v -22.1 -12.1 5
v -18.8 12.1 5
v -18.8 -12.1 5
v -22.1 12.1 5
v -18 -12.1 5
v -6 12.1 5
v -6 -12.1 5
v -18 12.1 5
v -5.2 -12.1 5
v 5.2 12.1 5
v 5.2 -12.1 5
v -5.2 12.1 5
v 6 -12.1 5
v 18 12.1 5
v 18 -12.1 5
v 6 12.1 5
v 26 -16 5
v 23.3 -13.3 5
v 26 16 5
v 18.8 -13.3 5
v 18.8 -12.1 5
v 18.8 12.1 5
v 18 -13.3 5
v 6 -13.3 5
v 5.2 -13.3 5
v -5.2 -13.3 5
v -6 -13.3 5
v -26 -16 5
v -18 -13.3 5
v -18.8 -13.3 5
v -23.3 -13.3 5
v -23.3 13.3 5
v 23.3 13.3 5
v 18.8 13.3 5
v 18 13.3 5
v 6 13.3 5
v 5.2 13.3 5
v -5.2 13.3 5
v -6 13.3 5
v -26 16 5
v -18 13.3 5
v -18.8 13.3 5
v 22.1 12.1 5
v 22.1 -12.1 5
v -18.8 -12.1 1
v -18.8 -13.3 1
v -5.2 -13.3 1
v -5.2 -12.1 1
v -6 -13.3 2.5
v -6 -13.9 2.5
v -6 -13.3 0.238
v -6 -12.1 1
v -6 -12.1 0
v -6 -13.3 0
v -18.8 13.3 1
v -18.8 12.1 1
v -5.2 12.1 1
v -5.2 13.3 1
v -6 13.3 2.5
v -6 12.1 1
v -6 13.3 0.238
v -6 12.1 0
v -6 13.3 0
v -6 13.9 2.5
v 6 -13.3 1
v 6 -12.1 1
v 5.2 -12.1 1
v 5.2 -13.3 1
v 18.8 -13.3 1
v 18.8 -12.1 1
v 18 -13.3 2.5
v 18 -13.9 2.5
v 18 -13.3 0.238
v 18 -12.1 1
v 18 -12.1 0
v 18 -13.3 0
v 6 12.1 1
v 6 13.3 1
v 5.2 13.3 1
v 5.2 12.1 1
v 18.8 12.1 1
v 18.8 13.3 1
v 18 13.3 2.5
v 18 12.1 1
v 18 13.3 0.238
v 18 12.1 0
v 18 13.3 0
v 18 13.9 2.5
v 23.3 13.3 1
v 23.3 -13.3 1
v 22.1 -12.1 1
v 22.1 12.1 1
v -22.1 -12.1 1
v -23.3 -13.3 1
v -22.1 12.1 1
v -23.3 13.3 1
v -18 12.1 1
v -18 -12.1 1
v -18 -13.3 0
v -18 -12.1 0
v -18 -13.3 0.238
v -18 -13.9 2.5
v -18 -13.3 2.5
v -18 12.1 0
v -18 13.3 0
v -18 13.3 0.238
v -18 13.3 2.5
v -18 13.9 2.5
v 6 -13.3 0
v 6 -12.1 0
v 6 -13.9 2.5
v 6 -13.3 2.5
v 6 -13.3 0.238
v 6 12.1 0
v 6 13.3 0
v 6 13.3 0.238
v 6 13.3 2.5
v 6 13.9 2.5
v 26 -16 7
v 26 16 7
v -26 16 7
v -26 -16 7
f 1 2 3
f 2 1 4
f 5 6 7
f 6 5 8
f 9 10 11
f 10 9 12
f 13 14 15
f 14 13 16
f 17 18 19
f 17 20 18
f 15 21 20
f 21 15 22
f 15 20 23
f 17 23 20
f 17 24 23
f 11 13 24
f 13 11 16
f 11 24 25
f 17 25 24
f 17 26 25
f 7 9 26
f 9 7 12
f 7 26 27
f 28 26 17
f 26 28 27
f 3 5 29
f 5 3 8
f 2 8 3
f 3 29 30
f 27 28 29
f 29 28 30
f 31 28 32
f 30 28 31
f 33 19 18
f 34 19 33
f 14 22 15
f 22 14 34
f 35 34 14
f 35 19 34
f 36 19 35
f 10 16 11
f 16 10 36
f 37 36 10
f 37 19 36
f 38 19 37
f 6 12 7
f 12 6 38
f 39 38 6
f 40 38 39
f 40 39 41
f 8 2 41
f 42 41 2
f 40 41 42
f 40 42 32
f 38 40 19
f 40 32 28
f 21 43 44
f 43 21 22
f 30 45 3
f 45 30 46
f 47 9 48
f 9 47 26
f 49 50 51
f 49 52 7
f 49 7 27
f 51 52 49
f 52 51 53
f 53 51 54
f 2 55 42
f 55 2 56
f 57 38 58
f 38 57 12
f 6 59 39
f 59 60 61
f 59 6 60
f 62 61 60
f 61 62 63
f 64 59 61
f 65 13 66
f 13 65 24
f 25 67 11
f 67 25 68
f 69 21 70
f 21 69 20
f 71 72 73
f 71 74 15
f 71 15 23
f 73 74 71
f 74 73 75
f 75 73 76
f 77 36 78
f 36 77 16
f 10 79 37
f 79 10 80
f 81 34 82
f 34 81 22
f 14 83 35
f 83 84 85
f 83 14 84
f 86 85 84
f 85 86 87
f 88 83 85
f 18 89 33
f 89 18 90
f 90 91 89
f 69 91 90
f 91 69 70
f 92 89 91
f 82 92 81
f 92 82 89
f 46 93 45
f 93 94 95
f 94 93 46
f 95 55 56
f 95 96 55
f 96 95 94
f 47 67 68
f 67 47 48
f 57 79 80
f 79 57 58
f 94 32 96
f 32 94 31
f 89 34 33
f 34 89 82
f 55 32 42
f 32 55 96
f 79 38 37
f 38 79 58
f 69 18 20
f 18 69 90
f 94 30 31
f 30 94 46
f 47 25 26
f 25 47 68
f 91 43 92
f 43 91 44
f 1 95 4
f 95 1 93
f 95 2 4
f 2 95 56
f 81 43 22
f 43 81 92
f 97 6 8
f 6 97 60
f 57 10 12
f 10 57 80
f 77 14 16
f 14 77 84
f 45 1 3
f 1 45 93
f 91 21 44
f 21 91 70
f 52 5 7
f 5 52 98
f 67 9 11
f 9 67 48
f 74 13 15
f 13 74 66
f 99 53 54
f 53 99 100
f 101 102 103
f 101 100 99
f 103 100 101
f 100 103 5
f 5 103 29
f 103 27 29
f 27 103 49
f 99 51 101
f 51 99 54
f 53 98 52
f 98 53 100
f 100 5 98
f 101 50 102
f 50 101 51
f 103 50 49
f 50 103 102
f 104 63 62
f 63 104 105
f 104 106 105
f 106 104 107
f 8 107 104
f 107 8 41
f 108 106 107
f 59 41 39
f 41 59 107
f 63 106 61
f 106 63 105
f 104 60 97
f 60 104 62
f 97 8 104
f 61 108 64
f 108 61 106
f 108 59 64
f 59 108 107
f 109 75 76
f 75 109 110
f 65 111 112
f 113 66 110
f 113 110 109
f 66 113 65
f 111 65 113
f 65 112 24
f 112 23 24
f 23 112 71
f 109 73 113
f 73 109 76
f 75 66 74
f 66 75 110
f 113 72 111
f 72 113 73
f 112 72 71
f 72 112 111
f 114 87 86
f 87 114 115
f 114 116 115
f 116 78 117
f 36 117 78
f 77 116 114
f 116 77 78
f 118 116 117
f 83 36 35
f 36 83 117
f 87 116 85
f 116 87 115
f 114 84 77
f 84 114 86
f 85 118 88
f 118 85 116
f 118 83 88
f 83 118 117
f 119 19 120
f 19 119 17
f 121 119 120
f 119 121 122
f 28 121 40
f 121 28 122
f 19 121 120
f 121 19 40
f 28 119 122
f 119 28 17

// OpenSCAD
// Snap-fit lid for 50x30 box, 1.5 mm walls, PETG. Z up, lid top faces up.
// Assumptions: box inner = 47x27; box has a small matching groove/undercut
// 2.5 mm below its top edge on the long inner walls for the hooks to catch.
plate_t   = 2;      // top plate thickness
overhang  = 1;      // plate overhang per side -> 52x32
clr       = 0.2;    // clearance per side between rim and box inner wall
rim_t     = 1.2;    // rim wall thickness
rim_h     = 4;      // rim depth below plate
hook_w    = 12;     // hook tab width
slot      = 0.8;    // relief slot each side of hook tab
barb      = 0.6;    // barb protrusion
hook_x    = 12;     // hook centres at x = +-12
ox = 47 - 2*clr;  oy = 27 - 2*clr;   // rim outer 46.6 x 26.6
z0 = 1;             // rim bottom; plate underside at z = z0+rim_h = 5

module rim() {
  difference() {
    translate([-ox/2,-oy/2,z0]) cube([ox,oy,rim_h+0.01]);
    translate([-ox/2+rim_t,-oy/2+rim_t,z0-1]) cube([ox-2*rim_t,oy-2*rim_t,rim_h+2]);
    // relief slots around hook tabs
    for (sx=[-1,1], sy=[-1,1], d=[-1,1])
      translate([sx*hook_x + d*(hook_w/2+slot/2) - slot/2, sy*(oy/2-rim_t/2) - 1.5, z0-1])
        cube([slot,3,rim_h+1]);
  }
}
module hook(sy) {
  translate([0,sy*(oy/2),0]) mirror([0,sy<0?1:0,0]) {
    // tab, extends down below the rim
    translate([-hook_w/2,-rim_t,0]) cube([hook_w,rim_t,z0+rim_h]);
    // barb: flat catch face at z=2.5 (2.5 below box top), ramp for lead-in
    rotate([90,0,90]) translate([0,0,-hook_w/2])
      linear_extrude(hook_w) polygon([[-0.01,2.5],[barb,2.5],[-0.01,0.2]]);
  }
}
union() {
  translate([-(50+2*overhang)/2+0,-(30+2*overhang)/2,z0+rim_h])
    cube([50+2*overhang,30+2*overhang,plate_t]);
  rim();
  for (sx=[-1,1], sy=[-1,1]) translate([sx*hook_x,0,0]) hook(sy);
}
